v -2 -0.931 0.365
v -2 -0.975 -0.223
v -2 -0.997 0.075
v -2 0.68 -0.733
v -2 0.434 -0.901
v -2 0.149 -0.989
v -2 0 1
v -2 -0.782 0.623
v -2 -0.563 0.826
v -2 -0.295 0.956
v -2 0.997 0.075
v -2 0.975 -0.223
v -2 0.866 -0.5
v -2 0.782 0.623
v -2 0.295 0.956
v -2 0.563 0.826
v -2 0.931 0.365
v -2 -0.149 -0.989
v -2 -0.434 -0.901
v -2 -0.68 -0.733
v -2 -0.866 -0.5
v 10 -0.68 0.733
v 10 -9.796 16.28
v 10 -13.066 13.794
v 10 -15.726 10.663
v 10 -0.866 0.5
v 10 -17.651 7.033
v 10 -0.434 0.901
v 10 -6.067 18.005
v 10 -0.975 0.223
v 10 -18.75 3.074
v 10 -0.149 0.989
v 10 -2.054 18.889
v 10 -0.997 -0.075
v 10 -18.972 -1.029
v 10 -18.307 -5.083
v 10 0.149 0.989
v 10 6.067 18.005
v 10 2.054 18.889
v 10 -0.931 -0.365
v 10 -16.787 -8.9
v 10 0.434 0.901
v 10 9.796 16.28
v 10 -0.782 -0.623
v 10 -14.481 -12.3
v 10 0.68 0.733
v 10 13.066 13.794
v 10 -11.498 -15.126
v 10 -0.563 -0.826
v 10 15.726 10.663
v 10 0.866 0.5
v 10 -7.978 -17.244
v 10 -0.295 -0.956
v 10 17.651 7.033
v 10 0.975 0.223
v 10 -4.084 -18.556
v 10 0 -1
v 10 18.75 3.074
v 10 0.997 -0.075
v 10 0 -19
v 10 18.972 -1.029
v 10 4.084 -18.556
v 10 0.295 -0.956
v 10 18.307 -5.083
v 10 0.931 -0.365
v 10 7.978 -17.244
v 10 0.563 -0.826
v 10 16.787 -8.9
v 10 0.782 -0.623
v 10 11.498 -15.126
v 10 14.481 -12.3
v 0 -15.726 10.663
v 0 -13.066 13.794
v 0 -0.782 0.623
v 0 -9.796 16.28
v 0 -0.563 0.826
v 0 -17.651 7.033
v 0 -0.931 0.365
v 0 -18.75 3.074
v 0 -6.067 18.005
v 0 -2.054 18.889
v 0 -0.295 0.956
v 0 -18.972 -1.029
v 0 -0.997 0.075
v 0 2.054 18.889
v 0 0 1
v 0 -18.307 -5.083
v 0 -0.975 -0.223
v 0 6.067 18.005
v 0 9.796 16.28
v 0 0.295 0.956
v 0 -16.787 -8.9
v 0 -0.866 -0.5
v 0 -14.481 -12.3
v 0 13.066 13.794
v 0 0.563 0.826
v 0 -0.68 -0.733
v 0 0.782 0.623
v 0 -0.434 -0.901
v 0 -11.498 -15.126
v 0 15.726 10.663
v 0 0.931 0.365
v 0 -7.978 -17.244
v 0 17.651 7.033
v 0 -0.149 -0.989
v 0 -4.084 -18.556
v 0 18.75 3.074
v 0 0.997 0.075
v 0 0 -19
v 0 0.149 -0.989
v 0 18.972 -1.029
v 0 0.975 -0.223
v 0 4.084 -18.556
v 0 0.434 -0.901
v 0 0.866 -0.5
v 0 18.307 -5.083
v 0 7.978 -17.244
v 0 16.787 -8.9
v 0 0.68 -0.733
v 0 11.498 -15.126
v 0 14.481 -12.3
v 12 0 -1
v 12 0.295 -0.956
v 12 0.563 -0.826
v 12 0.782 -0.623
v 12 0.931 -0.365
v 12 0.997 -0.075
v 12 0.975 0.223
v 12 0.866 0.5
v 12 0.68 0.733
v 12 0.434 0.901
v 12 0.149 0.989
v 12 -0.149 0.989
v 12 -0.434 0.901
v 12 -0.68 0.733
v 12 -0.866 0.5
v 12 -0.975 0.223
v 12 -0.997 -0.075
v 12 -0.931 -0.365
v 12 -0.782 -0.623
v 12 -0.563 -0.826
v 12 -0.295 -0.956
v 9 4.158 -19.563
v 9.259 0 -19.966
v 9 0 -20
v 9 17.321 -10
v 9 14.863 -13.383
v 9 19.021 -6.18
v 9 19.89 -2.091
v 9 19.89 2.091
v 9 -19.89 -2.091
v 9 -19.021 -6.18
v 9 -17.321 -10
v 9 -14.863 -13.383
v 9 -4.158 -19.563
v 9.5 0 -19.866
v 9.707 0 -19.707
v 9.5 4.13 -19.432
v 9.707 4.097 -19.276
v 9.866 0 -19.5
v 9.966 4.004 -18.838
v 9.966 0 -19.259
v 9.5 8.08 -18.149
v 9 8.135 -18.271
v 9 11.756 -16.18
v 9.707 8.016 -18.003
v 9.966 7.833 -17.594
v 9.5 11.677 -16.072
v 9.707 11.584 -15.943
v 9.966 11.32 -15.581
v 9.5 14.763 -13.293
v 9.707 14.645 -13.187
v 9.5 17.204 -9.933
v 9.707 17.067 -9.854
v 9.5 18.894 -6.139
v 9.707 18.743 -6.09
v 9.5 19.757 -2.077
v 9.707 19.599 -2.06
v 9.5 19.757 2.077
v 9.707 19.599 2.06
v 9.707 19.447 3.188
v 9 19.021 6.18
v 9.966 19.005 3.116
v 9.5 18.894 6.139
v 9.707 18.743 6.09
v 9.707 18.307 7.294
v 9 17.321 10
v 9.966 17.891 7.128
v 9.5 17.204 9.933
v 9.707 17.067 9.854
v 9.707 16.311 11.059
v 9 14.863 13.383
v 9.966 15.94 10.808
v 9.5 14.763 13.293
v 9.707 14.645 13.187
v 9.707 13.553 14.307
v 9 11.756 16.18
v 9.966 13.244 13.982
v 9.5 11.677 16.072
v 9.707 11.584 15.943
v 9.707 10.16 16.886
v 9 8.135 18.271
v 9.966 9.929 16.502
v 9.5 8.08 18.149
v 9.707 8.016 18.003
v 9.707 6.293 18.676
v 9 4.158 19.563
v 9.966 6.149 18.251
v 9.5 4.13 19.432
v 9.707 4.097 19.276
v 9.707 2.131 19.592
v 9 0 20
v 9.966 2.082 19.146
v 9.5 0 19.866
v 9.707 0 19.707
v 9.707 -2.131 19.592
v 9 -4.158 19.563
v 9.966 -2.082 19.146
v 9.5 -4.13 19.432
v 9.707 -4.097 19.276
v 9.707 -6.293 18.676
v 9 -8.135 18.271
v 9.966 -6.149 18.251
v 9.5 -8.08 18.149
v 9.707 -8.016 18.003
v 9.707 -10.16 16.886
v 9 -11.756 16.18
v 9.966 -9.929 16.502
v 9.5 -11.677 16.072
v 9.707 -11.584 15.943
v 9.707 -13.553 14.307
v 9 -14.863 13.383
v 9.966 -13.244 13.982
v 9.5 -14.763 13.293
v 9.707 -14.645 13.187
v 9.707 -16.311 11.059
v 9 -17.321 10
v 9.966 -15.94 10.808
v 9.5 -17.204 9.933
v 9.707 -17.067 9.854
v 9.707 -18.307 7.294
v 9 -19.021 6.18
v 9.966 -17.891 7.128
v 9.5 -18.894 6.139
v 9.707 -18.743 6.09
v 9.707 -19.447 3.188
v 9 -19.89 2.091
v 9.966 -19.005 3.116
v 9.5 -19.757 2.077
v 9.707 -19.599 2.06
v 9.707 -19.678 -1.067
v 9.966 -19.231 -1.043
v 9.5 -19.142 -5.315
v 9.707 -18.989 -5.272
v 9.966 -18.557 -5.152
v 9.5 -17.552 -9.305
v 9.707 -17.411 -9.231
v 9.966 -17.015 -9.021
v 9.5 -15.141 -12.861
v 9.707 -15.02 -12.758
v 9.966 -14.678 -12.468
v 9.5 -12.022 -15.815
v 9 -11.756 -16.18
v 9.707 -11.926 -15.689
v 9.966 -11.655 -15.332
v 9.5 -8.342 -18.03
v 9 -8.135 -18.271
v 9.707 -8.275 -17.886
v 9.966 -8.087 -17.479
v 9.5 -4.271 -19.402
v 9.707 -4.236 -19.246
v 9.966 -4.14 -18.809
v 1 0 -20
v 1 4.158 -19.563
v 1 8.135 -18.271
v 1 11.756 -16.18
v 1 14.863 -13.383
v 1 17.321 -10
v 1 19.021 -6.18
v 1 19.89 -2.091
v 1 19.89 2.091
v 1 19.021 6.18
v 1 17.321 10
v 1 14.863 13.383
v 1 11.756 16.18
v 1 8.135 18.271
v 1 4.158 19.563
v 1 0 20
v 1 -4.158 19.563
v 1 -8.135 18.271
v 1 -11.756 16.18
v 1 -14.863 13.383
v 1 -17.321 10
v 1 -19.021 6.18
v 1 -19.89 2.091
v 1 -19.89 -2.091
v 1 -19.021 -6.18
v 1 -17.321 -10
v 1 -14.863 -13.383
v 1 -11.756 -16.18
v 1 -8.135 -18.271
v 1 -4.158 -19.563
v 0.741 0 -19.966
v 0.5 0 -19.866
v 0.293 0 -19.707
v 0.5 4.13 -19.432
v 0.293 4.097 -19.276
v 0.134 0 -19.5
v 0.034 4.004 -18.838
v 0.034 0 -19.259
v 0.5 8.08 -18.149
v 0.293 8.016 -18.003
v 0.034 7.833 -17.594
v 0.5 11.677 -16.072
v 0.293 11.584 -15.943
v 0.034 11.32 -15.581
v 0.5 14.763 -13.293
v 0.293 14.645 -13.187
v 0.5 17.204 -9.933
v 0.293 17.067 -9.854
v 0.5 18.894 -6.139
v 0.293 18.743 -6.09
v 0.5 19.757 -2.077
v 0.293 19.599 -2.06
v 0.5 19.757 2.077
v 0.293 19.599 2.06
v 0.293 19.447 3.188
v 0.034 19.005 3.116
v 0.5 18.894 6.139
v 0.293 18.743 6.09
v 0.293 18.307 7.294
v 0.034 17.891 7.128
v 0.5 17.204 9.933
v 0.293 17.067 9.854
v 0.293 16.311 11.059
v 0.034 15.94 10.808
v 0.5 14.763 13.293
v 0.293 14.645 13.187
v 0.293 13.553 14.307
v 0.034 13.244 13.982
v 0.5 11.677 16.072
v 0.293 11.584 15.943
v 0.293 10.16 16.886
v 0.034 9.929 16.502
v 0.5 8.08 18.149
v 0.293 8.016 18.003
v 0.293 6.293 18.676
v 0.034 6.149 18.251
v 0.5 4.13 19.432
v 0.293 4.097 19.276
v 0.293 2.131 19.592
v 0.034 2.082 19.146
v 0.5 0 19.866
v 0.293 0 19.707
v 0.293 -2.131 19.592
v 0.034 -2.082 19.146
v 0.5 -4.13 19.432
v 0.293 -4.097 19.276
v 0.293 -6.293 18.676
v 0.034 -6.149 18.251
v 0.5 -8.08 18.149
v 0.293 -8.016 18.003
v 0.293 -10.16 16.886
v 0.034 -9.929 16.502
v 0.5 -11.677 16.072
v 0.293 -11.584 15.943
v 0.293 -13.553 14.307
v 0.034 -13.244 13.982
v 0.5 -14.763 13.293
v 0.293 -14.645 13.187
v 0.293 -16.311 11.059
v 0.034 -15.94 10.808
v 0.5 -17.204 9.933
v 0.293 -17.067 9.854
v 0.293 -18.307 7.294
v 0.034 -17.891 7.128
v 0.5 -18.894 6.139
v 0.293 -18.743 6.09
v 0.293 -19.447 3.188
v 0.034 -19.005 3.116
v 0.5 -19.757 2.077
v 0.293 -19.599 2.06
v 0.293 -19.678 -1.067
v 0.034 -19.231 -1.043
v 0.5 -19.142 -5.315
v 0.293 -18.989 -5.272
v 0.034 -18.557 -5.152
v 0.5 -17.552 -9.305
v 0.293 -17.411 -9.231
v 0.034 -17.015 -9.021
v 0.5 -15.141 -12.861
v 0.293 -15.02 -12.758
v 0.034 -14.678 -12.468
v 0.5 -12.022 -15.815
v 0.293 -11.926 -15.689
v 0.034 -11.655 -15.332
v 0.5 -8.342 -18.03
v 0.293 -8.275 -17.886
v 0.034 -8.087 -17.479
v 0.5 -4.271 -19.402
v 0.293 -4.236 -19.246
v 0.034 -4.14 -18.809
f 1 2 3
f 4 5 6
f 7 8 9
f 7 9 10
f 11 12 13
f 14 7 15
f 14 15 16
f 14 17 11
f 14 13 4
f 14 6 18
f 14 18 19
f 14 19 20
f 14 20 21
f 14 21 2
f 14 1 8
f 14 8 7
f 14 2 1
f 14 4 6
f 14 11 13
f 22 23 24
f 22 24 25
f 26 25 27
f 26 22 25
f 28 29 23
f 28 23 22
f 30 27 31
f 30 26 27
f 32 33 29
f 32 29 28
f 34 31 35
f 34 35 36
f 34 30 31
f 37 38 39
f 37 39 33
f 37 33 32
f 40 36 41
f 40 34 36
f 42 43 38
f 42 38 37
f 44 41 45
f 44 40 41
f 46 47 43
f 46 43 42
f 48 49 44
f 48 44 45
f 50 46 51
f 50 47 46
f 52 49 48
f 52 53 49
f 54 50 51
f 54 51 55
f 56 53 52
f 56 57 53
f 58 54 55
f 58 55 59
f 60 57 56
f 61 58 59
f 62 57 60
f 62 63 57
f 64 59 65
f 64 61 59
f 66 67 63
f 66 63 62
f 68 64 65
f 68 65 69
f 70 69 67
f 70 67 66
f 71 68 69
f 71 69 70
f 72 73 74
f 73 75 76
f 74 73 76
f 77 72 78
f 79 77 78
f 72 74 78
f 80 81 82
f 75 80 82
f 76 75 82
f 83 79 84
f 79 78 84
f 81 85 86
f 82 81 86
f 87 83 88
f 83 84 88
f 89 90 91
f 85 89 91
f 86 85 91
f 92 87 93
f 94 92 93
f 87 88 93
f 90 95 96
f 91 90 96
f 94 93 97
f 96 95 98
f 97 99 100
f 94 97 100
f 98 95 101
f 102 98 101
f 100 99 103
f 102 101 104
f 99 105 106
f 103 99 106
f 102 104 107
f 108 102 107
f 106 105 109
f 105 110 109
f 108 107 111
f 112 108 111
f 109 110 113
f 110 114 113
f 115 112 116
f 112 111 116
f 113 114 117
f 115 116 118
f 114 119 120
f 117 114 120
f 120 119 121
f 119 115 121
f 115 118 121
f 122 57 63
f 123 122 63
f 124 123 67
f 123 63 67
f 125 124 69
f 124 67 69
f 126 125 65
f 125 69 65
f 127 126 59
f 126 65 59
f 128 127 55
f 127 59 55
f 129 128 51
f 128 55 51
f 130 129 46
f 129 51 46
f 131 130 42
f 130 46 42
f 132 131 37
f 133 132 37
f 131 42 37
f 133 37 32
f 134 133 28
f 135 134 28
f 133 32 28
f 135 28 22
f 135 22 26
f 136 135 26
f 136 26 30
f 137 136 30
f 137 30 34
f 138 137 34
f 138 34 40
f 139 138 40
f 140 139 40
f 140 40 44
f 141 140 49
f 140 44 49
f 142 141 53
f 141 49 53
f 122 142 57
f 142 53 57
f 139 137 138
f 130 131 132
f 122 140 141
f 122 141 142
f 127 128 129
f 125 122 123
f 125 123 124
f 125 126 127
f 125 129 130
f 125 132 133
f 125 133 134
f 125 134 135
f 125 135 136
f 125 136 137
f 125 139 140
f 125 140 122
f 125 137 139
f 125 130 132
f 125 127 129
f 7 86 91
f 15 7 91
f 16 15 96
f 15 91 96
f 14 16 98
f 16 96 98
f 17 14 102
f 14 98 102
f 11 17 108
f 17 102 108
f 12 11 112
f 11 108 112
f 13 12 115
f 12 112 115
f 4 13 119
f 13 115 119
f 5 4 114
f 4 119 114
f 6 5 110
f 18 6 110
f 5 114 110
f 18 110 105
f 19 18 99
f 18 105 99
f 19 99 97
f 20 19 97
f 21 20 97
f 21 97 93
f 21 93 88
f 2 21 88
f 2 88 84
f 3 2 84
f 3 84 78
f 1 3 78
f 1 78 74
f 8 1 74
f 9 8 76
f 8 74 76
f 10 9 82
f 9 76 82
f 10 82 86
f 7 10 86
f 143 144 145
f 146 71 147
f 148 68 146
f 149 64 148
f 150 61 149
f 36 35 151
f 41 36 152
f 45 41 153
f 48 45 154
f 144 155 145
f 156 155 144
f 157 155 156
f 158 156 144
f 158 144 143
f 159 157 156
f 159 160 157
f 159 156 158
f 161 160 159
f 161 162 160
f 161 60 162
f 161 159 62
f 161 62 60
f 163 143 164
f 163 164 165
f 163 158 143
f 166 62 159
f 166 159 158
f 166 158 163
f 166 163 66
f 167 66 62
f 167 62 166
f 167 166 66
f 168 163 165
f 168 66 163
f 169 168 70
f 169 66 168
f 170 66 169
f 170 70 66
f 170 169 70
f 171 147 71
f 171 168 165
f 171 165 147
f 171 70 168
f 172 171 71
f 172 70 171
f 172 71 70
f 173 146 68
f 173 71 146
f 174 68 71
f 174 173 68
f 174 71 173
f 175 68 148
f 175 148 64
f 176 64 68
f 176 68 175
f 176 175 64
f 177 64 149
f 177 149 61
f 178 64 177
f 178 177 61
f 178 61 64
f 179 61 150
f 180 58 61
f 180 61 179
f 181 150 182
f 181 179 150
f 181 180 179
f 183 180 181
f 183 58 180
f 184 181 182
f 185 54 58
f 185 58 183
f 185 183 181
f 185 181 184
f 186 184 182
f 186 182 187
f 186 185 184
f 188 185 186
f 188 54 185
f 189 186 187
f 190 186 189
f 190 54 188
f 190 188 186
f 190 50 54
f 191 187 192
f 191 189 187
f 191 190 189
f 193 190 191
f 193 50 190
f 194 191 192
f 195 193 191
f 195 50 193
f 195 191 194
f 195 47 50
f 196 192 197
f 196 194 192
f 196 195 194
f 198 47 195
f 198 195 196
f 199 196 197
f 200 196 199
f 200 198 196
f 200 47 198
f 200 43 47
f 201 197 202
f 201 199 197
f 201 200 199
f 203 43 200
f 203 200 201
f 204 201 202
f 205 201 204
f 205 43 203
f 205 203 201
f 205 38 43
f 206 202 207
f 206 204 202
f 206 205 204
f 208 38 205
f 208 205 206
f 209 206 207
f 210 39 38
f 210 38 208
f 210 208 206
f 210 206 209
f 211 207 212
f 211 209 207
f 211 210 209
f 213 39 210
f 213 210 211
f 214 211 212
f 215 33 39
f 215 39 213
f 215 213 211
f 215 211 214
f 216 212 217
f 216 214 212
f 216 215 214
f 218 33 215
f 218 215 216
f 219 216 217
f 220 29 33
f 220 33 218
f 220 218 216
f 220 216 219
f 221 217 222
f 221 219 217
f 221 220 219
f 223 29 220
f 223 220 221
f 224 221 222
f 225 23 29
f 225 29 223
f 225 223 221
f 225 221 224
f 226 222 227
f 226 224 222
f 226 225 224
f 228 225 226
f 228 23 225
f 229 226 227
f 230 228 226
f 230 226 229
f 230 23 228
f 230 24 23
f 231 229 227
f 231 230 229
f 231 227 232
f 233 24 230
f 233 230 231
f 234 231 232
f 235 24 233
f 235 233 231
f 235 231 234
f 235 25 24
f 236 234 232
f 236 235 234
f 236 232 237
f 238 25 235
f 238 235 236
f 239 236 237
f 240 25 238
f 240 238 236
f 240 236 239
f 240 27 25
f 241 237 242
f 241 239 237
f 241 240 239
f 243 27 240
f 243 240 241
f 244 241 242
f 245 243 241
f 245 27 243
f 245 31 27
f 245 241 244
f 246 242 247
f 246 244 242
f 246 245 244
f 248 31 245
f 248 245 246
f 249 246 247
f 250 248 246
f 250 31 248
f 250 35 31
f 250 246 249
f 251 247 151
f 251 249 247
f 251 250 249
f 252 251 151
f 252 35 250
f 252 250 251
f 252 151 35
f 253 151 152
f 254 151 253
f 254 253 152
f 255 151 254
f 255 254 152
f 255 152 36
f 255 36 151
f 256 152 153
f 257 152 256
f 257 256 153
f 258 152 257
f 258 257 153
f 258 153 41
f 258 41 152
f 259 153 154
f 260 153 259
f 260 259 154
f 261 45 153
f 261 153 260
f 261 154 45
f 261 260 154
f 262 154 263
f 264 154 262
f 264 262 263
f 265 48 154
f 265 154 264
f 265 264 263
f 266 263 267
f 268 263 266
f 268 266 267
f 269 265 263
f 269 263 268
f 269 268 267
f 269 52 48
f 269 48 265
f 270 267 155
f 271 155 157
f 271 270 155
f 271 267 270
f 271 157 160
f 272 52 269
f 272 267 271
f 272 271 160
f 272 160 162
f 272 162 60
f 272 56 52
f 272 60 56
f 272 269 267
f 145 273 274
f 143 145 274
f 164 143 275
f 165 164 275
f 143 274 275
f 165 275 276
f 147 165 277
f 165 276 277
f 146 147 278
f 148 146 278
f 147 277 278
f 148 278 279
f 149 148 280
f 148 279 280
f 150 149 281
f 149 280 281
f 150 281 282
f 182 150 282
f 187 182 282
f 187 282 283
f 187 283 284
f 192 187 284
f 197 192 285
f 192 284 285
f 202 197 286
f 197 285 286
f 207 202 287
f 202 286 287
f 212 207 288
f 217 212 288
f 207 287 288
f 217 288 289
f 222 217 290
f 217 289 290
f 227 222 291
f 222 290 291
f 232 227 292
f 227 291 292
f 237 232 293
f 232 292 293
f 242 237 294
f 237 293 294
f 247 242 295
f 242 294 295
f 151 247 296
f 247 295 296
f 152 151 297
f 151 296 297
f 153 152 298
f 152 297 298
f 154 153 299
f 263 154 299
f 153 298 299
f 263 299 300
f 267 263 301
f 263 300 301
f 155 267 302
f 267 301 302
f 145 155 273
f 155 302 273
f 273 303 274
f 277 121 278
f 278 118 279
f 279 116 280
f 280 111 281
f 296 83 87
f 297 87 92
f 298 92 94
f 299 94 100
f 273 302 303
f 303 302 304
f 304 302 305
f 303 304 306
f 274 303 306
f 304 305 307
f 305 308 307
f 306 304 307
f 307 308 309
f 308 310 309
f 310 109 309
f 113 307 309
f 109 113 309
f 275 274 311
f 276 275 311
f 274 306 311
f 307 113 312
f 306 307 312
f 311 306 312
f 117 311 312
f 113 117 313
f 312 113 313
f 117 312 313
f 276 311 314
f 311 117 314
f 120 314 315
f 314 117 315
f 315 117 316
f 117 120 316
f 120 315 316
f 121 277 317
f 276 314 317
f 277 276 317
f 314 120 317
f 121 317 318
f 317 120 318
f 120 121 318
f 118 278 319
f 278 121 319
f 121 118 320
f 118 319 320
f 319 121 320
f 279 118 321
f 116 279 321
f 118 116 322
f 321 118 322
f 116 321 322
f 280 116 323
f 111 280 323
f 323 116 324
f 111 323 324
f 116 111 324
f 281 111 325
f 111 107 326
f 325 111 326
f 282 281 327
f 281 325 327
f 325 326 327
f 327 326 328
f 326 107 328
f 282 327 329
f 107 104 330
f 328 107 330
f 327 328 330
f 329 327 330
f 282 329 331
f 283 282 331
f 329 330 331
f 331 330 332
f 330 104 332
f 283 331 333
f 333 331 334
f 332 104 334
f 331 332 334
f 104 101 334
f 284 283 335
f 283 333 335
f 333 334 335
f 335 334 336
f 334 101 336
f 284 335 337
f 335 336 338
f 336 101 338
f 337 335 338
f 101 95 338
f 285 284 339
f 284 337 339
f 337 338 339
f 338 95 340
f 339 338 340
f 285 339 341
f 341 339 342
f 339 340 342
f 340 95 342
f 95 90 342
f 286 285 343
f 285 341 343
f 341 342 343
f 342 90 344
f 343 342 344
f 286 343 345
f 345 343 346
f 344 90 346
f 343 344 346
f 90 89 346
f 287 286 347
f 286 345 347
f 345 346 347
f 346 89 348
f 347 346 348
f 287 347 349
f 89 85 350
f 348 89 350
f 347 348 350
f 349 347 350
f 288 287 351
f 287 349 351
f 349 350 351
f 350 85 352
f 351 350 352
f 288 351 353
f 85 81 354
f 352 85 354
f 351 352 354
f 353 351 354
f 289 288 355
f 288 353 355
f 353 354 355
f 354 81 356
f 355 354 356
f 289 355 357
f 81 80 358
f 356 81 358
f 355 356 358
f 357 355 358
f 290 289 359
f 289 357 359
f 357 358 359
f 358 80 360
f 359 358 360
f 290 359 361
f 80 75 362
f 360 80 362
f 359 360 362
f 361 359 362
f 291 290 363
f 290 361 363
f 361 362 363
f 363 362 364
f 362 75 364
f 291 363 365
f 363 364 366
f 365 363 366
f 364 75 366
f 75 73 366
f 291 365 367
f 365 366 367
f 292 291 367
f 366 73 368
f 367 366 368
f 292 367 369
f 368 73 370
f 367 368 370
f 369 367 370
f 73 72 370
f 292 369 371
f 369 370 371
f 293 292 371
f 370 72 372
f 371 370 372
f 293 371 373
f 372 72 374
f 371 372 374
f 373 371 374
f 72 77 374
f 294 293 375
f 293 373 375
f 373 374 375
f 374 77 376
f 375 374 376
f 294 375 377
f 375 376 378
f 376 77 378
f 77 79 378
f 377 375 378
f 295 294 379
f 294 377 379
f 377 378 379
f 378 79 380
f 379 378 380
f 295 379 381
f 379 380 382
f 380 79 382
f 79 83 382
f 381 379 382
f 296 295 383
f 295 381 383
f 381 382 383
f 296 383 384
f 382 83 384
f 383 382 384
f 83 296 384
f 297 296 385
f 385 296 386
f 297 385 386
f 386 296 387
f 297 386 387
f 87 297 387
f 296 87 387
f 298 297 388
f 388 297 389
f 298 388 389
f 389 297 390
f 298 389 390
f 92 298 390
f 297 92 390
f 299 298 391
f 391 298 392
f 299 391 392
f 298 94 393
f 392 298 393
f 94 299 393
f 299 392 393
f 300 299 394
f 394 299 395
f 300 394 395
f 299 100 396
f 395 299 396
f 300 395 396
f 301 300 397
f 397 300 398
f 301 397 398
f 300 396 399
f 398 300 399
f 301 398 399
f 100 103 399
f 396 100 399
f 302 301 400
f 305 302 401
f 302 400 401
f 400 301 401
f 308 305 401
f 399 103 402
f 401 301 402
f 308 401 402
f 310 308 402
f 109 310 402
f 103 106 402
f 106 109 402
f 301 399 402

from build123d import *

# Parameters (mm, degrees)
SKETCH1_R           = 20
BOSS_EXTRUDE1_DEPTH = 10
SKETCH2_R           = 1
BOSS_EXTRUDE2_DEPTH = 2
SKETCH3_R           = 1
BOSS_EXTRUDE3_DEPTH = 2
FILLET2_R           = 1


with BuildPart() as part:
    # Sketch1 → Boss-Extrude1 (new body)
    with BuildSketch(Plane(origin=(0, 0, 0), x_dir=(0, 0, -1), z_dir=(1, 0, 0))):
        Circle(SKETCH1_R)
    extrude(amount=BOSS_EXTRUDE1_DEPTH)

    # Sketch2 → Boss-Extrude2 (add)
    with BuildSketch(Plane(origin=(10, 0, 0), x_dir=(0, 0, -1), z_dir=(1, 0, 0))):
        Circle(SKETCH2_R)
    extrude(amount=BOSS_EXTRUDE2_DEPTH)

    # Sketch3 → Boss-Extrude3 (add)
    with BuildSketch(Plane.ZY):
        Circle(SKETCH3_R)
    extrude(amount=BOSS_EXTRUDE3_DEPTH)

    # Fillet2
    fillet2_edges = [part.edges().sort_by_distance(p)[0] for p in [
        (0, 0, 20),
        (10, 0, 20),
    ]]
    fillet(fillet2_edges, radius=FILLET2_R)


solid = part.part
